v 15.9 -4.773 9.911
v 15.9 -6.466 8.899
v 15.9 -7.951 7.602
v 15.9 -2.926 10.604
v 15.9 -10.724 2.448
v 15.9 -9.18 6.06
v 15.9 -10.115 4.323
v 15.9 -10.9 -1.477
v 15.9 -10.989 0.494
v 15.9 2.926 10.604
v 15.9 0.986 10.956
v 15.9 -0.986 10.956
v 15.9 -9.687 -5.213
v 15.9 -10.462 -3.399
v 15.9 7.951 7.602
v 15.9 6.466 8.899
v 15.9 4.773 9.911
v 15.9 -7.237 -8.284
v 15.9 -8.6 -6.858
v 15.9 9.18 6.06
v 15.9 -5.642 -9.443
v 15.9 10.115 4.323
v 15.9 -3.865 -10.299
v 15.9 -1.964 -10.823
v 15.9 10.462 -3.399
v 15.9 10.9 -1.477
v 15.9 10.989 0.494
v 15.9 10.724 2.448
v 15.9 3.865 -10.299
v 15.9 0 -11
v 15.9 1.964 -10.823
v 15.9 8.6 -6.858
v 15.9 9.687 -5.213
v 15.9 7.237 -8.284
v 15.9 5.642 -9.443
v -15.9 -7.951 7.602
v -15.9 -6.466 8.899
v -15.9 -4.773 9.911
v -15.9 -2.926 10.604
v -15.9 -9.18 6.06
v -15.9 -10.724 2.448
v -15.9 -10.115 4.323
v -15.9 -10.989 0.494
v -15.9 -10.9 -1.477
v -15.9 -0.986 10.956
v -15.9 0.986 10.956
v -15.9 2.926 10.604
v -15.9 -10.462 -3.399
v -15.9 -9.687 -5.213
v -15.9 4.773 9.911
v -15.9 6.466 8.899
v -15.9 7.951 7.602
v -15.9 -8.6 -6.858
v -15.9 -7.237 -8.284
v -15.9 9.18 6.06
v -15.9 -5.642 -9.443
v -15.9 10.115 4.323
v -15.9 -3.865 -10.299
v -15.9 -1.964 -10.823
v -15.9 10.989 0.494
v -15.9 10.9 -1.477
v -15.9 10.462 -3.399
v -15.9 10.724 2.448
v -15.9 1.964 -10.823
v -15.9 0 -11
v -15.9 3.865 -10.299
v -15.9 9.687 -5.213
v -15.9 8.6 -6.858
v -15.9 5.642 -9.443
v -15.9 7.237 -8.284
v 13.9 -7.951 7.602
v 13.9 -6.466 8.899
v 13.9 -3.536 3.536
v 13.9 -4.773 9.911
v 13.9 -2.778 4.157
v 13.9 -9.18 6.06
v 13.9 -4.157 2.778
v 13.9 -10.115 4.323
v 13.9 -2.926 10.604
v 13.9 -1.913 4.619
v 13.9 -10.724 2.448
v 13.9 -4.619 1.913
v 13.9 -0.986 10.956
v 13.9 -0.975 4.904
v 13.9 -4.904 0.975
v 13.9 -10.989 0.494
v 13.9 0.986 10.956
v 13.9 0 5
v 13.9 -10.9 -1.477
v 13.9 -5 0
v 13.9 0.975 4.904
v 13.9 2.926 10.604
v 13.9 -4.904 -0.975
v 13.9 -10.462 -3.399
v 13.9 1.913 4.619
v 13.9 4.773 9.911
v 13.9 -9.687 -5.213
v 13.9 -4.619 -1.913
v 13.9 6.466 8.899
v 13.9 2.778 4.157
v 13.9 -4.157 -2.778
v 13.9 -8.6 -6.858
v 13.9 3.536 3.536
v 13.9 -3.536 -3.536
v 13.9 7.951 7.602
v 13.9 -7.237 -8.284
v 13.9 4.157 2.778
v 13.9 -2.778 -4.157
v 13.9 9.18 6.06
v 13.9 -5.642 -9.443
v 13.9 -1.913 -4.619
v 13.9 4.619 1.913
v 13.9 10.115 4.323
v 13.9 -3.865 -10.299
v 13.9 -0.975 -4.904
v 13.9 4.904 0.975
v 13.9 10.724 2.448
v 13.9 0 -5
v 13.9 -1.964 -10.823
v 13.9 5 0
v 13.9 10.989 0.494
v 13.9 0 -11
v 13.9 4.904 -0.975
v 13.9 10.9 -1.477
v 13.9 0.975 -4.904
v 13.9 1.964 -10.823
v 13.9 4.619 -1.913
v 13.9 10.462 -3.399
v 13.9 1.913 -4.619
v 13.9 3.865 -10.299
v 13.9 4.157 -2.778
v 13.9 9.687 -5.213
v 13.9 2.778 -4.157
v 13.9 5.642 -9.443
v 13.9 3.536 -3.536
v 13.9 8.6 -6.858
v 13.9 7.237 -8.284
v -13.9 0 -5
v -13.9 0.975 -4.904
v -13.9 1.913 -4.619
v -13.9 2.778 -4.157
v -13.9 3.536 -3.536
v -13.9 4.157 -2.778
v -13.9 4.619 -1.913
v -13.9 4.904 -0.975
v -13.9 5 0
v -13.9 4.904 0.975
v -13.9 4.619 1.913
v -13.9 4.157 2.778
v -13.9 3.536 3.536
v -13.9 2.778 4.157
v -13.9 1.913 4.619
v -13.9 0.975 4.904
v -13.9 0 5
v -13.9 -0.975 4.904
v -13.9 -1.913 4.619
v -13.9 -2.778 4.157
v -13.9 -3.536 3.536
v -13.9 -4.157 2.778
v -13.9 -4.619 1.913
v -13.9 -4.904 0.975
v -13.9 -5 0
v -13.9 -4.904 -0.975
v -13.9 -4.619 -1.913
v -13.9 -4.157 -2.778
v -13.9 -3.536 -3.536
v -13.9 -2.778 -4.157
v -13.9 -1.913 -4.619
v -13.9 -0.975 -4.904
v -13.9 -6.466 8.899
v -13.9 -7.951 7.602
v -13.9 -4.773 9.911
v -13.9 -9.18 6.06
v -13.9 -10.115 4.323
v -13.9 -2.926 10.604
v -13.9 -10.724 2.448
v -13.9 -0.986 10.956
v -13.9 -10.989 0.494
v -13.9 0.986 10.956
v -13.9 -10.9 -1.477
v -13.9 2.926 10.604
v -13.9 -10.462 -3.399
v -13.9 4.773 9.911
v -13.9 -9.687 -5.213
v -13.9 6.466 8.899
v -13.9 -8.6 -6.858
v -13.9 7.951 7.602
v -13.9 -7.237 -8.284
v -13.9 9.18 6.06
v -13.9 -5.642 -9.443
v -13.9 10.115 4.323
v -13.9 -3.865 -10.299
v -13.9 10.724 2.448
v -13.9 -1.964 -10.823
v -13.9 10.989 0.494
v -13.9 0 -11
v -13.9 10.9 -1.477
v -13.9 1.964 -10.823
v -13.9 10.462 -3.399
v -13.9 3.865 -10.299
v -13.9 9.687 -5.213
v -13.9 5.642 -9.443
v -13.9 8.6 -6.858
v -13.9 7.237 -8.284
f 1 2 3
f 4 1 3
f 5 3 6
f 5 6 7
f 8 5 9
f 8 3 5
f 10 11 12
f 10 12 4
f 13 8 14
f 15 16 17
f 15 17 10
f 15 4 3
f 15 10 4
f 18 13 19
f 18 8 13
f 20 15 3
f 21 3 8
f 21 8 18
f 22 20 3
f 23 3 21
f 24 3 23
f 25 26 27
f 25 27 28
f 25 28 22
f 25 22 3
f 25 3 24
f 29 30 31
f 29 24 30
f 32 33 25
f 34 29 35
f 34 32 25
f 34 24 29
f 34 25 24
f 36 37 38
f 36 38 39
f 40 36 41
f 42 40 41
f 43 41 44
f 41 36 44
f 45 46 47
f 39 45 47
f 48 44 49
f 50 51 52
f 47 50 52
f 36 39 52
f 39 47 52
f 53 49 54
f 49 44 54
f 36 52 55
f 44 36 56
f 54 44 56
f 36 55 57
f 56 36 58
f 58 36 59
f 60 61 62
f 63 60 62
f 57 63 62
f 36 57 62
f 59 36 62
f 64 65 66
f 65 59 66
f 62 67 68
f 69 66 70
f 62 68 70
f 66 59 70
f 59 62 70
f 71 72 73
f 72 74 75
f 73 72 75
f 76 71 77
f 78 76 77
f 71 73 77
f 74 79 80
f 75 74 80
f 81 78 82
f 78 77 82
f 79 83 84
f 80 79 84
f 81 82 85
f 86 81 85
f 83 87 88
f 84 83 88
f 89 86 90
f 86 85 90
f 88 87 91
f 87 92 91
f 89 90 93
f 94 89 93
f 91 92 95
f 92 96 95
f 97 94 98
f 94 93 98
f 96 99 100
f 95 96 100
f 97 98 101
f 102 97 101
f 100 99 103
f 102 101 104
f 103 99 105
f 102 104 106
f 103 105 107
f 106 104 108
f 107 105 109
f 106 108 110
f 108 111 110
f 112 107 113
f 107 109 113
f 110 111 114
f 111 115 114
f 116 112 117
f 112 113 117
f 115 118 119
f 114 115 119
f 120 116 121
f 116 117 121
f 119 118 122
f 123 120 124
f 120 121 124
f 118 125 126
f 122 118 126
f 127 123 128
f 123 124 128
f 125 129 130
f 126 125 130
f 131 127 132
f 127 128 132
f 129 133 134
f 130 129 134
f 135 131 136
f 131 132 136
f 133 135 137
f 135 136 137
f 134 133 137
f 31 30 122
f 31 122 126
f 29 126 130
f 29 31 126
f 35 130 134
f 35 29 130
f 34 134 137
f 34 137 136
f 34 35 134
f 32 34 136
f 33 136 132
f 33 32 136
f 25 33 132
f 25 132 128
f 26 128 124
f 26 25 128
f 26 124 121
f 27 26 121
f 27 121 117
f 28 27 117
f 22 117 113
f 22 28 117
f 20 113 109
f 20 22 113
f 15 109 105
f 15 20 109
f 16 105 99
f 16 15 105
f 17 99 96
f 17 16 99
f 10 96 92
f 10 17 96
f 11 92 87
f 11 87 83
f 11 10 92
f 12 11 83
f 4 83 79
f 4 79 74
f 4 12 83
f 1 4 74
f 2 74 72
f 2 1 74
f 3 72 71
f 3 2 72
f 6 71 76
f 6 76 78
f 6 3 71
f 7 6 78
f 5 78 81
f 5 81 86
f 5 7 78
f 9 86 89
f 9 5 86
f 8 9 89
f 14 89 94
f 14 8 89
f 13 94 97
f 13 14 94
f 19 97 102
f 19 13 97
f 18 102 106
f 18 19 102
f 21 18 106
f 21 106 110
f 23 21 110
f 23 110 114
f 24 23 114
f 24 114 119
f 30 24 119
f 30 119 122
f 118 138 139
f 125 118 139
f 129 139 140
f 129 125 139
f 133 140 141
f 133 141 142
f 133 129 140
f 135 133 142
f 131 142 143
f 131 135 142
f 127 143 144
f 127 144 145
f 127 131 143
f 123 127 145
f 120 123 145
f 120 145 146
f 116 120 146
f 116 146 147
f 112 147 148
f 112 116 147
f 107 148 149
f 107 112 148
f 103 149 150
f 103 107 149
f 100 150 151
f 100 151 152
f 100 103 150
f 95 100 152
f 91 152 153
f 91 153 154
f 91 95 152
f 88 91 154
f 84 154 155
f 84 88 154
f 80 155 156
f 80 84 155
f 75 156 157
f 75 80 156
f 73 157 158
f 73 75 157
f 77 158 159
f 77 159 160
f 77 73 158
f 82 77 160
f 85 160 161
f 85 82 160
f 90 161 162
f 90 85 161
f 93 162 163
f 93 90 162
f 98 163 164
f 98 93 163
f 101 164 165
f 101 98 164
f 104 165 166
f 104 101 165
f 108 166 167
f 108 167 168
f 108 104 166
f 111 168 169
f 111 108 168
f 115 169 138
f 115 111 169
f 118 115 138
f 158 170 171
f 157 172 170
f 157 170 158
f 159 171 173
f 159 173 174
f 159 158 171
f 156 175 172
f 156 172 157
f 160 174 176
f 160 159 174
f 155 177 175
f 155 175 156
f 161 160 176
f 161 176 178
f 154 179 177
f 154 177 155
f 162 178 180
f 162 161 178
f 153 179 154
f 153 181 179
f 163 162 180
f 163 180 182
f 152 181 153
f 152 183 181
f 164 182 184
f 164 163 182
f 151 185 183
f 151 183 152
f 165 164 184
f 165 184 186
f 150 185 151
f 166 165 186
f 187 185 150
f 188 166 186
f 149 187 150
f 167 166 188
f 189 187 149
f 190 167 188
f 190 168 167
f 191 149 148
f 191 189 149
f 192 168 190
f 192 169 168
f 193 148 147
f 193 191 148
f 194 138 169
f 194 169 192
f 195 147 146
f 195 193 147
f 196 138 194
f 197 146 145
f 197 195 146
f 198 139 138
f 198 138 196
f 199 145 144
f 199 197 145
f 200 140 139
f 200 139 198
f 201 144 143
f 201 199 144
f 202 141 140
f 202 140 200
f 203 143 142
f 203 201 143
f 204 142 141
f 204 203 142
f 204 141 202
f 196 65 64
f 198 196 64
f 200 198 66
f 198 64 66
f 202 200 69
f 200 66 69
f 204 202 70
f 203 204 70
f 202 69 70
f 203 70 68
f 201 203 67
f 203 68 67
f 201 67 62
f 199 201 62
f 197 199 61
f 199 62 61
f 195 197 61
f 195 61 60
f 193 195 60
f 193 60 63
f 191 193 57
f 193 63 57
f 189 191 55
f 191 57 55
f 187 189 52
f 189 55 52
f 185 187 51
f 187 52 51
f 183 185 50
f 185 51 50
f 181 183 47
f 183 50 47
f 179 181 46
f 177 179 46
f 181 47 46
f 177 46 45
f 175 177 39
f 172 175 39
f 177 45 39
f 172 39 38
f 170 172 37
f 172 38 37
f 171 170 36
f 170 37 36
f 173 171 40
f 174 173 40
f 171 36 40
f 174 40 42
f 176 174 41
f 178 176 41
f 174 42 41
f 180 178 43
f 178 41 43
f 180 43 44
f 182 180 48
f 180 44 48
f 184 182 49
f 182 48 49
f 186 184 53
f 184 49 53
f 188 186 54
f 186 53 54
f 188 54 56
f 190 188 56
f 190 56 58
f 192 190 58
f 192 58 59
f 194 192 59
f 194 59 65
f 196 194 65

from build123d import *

# Parameters (mm, degrees)
SKETCH1_R           = 5
BOSS_EXTRUDE1_DEPTH = 15.9
SKETCH2_R           = 11
BOSS_EXTRUDE2_DEPTH = 2


with BuildPart() as part:
    # Sketch1 → Boss-Extrude1 (new, symmetric)
    with BuildSketch(Plane(origin=(0, 0, 0), x_dir=(0, 0, -1), z_dir=(1, 0, 0))):
        Circle(SKETCH1_R)
    extrude(amount=BOSS_EXTRUDE1_DEPTH, both=True)

    # Sketch2 → Boss-Extrude2 (add)
    with BuildSketch(Plane(origin=(15.9, 0, 0), x_dir=(0, 0, -1), z_dir=(1, 0, 0))):
        Circle(SKETCH2_R)
    boss_extrude2 = extrude(amount=-BOSS_EXTRUDE2_DEPTH)

    # Mirror1: Boss-Extrude2 across plane
    add(boss_extrude2.mirror(Plane(origin=(0, 0, 0), x_dir=(0, 0, 1), z_dir=(1, 0, 0))))


solid = part.part
